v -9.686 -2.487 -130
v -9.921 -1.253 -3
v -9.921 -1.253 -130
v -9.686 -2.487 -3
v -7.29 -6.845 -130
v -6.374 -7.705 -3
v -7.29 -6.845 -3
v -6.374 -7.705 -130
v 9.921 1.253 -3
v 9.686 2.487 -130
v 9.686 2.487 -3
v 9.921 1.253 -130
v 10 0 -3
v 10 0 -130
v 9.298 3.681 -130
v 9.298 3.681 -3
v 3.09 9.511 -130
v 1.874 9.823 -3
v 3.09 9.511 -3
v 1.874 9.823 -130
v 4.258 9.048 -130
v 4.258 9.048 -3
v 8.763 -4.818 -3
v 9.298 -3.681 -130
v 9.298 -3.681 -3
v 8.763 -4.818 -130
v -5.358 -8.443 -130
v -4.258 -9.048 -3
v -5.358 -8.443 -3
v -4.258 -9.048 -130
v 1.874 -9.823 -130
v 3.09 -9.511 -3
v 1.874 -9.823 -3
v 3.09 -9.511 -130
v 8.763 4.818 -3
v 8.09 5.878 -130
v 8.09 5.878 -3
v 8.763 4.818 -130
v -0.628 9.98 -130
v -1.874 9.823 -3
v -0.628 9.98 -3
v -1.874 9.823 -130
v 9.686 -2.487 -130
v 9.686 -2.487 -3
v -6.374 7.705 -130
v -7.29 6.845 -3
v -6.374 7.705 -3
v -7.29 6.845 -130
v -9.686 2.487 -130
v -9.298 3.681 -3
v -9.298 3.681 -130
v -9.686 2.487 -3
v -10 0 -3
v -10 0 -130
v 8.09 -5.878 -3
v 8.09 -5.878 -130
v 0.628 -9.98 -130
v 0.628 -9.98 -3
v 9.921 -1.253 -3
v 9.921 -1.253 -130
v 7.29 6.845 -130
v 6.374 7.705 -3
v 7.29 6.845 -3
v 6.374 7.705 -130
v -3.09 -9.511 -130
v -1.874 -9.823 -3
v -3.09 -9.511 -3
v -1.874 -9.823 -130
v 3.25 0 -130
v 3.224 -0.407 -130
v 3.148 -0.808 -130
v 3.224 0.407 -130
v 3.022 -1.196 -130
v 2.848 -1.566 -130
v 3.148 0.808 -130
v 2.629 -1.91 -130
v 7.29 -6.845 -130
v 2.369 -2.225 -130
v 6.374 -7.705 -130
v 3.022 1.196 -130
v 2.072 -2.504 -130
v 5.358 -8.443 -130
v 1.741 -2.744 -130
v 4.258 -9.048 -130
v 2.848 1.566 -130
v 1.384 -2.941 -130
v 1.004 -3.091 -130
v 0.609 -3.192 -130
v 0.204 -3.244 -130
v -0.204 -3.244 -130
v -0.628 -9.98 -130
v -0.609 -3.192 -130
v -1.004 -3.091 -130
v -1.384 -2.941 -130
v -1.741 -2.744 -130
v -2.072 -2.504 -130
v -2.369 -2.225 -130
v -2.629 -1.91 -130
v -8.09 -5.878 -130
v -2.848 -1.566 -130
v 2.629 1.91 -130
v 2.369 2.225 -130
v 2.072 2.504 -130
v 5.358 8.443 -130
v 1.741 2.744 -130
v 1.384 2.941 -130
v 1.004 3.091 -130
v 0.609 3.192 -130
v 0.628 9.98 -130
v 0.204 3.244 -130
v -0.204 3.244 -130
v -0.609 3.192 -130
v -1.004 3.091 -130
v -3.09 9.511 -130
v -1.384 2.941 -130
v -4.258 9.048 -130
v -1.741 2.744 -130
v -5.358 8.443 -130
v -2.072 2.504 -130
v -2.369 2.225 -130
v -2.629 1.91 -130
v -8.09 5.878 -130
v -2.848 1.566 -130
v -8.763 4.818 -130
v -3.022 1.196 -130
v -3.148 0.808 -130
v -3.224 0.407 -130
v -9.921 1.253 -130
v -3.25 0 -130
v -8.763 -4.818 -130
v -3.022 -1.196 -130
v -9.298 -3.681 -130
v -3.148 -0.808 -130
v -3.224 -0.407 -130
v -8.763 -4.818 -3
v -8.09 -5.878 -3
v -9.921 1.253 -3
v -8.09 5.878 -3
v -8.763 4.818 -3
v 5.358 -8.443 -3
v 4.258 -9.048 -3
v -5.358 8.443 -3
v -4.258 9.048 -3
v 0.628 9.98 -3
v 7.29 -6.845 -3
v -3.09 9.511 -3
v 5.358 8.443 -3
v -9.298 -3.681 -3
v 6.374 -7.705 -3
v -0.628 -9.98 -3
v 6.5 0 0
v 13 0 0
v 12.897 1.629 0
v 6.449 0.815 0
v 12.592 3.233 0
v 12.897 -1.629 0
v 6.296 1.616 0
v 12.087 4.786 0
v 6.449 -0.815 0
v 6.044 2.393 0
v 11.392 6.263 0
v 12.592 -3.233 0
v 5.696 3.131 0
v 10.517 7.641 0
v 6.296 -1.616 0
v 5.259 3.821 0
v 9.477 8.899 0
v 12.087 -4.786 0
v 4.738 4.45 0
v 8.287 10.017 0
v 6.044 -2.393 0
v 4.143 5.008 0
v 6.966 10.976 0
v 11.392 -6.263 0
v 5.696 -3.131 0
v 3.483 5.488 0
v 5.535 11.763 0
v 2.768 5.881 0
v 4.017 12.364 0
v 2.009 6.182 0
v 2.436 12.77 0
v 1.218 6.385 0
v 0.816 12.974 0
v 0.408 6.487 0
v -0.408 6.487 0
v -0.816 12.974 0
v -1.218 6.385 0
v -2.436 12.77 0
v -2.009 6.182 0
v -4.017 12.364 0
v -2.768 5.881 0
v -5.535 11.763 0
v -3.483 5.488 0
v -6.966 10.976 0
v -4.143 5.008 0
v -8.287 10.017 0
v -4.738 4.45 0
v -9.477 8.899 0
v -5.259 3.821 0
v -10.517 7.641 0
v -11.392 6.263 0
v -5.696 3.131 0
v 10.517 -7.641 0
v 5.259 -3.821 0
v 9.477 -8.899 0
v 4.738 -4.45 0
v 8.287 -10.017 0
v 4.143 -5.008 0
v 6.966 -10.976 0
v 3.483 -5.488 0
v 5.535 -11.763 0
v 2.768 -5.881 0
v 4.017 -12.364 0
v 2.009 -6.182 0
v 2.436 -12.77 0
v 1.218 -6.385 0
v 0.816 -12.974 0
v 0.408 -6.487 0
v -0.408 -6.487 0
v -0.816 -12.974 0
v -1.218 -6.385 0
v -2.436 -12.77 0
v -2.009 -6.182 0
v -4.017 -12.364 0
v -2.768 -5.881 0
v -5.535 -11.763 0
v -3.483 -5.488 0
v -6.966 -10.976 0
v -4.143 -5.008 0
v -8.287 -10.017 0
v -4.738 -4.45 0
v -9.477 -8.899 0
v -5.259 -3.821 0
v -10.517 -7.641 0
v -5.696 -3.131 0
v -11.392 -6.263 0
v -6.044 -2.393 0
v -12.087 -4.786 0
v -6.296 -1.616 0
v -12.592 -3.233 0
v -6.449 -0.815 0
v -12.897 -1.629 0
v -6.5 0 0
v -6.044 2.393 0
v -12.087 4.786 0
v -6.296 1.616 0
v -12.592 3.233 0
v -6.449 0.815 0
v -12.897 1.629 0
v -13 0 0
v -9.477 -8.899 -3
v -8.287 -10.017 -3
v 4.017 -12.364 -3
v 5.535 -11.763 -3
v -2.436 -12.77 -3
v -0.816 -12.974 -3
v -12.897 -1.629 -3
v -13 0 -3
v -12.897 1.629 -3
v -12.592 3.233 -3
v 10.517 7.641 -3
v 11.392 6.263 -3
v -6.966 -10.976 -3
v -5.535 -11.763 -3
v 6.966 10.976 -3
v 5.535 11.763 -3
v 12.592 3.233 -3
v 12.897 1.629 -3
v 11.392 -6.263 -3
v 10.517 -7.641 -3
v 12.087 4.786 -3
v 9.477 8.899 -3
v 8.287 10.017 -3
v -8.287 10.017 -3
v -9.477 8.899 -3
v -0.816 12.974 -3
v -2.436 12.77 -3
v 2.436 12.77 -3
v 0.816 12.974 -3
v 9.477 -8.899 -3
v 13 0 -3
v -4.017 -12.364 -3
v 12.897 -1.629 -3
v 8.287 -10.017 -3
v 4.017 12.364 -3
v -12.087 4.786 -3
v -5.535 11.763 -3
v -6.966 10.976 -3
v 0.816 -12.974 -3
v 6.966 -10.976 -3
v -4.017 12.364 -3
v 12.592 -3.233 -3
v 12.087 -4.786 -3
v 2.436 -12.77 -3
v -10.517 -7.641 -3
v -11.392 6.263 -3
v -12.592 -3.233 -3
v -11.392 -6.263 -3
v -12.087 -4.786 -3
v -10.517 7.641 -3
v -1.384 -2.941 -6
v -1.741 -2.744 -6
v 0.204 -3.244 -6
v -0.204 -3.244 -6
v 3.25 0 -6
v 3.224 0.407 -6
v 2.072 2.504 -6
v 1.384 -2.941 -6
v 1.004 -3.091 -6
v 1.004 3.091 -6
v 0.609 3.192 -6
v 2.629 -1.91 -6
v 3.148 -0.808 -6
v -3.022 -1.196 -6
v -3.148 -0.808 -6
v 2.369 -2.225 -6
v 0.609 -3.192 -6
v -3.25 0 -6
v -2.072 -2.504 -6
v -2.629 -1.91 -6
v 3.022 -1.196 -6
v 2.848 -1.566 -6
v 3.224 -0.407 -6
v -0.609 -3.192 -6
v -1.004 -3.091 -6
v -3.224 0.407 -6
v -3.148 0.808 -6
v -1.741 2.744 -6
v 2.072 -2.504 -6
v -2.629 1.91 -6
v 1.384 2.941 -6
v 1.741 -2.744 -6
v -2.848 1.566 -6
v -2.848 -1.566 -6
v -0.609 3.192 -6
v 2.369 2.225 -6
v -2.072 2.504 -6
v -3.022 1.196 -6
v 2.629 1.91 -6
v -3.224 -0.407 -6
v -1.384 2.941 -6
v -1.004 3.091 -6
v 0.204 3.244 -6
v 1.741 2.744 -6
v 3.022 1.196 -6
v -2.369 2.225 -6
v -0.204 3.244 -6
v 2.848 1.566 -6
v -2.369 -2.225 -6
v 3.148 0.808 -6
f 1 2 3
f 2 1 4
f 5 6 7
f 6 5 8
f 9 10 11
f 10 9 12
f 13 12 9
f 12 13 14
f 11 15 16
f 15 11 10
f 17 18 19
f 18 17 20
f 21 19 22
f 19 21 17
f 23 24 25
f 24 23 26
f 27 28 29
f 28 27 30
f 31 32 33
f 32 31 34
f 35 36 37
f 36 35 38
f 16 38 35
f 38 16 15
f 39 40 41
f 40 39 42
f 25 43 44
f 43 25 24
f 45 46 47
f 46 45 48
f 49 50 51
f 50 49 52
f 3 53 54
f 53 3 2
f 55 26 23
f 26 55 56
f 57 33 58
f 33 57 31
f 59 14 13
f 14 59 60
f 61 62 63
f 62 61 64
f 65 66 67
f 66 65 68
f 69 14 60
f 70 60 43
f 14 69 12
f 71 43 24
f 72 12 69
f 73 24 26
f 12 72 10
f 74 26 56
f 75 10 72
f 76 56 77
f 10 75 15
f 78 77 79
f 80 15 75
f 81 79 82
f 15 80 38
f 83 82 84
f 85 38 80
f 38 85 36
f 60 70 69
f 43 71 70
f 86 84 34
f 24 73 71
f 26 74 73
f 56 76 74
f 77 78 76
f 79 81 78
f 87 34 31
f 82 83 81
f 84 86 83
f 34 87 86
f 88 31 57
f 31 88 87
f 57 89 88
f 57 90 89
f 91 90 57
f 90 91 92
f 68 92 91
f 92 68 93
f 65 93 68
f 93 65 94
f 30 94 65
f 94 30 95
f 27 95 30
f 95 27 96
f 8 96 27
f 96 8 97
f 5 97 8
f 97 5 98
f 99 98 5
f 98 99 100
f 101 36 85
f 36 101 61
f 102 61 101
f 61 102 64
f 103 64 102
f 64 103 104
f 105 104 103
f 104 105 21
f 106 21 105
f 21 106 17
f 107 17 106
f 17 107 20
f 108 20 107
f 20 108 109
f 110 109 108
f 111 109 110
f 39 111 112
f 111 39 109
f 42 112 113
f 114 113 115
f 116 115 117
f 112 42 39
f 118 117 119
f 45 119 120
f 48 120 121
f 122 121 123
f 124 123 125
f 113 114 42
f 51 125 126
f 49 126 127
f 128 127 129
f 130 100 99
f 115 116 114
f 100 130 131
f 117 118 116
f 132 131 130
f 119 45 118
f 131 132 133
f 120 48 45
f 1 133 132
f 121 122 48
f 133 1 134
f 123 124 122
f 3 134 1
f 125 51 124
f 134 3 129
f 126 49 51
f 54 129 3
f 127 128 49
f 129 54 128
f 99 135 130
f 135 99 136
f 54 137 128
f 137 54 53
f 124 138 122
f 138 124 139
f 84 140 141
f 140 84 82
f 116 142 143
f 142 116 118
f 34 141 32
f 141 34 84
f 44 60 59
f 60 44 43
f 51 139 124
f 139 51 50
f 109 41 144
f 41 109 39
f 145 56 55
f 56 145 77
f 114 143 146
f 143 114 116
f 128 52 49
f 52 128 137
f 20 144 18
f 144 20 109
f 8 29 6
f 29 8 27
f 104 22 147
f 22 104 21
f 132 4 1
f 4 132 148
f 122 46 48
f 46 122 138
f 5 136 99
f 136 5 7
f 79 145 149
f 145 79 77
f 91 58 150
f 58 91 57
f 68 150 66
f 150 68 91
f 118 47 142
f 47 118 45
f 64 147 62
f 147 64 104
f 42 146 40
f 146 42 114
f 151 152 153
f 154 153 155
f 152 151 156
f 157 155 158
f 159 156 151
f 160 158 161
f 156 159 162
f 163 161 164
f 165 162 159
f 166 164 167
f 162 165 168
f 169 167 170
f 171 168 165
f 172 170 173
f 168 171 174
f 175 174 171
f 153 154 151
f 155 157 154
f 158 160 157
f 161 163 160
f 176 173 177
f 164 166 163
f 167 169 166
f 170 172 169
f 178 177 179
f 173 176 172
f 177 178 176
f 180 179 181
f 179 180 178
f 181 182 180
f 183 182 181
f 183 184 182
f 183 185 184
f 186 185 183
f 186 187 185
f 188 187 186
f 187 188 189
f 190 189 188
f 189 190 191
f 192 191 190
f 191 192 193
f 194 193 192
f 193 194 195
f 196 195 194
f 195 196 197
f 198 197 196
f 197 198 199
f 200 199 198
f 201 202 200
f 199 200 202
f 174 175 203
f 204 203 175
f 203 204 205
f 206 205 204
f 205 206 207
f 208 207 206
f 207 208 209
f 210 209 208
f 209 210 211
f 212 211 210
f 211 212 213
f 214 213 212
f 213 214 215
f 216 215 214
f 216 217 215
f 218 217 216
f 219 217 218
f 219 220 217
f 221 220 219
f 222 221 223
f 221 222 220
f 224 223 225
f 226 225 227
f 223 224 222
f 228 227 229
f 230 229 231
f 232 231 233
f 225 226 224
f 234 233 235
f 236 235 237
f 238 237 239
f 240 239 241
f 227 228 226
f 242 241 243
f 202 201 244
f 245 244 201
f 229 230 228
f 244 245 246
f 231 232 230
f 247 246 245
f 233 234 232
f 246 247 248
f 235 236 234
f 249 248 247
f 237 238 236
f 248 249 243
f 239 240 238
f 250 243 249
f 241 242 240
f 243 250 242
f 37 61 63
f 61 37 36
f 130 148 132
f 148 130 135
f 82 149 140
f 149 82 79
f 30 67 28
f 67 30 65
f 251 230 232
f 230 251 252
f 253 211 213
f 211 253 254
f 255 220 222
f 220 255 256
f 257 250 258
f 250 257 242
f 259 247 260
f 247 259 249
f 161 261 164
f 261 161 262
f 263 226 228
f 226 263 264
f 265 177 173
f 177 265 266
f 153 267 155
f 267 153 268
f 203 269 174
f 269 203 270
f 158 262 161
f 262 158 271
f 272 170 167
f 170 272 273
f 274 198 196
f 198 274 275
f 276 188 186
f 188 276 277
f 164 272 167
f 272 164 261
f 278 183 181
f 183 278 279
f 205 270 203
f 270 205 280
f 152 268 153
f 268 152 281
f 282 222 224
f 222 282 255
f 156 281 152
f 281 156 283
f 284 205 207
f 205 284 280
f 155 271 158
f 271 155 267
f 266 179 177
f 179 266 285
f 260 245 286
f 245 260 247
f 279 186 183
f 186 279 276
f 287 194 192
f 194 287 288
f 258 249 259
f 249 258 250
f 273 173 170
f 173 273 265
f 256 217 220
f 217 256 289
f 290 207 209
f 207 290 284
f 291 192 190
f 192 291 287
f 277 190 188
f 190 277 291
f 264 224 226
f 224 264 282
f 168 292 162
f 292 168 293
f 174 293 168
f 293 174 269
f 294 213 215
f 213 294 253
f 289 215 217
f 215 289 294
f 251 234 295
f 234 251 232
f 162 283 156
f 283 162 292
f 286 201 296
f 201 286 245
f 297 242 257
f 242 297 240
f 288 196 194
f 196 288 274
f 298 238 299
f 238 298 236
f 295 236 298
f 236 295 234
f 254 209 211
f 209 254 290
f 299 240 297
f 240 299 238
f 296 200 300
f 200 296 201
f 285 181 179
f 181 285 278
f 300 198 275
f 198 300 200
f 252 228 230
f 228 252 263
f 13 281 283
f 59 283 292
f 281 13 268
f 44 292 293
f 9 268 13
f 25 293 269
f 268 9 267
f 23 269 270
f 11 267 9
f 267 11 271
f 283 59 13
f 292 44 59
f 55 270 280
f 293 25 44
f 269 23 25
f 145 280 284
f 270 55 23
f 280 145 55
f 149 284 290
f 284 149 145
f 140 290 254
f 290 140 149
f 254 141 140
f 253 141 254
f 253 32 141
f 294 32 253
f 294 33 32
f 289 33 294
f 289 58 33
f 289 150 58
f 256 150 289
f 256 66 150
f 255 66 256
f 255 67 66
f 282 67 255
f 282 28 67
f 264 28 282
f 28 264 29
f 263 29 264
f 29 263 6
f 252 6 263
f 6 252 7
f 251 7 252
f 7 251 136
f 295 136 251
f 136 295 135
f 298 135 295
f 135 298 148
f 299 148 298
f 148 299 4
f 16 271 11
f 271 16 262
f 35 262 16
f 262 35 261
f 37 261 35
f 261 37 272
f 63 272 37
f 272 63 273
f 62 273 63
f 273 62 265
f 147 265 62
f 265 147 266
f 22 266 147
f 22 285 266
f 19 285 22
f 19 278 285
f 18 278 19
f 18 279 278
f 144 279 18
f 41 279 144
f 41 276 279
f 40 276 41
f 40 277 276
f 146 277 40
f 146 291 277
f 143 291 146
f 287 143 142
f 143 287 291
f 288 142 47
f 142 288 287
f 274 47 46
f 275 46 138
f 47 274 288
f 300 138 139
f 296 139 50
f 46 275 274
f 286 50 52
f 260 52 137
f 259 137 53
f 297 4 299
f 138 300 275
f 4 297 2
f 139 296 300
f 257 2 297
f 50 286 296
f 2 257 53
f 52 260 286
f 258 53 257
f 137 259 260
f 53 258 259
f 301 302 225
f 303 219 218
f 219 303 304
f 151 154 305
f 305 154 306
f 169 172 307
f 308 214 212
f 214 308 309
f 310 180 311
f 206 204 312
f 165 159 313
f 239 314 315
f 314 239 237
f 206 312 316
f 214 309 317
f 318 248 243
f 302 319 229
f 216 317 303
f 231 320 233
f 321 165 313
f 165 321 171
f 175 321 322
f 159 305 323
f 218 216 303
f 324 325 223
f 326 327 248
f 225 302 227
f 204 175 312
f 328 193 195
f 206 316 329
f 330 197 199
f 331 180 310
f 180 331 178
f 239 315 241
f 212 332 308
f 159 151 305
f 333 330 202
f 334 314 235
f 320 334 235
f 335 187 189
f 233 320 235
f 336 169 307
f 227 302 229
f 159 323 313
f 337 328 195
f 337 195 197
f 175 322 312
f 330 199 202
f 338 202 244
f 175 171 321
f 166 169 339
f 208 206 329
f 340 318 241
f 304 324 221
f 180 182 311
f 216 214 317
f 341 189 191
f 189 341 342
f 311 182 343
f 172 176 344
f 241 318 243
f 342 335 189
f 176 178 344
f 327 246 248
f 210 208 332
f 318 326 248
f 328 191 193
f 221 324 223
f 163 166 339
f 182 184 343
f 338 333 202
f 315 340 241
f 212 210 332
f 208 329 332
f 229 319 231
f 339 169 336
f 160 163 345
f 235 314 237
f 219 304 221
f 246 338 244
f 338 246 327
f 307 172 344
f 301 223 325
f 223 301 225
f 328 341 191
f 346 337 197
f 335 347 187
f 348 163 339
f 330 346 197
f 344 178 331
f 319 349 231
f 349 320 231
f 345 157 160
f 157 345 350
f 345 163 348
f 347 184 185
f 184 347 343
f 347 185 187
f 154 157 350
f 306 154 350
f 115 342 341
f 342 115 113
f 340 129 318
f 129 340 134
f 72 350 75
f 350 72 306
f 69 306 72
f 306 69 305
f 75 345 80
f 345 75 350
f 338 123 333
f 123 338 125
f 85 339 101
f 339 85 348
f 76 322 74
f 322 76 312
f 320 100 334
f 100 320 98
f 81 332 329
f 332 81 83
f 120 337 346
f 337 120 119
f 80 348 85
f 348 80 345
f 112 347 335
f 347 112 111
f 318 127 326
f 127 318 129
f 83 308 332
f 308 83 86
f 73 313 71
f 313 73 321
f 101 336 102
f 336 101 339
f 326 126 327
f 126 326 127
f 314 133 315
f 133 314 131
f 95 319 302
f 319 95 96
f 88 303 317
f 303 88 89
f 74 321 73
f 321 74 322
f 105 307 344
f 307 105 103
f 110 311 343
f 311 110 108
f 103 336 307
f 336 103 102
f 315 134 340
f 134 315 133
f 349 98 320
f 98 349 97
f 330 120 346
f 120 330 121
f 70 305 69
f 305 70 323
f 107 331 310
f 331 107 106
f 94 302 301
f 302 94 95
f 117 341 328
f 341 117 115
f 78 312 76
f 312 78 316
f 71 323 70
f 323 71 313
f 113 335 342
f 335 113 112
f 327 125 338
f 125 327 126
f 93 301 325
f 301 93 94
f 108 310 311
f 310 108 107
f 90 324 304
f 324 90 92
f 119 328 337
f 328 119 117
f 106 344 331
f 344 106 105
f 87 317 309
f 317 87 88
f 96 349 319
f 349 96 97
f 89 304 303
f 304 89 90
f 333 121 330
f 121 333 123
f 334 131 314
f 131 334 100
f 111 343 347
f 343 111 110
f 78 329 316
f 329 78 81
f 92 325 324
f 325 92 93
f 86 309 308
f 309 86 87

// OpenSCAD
$fn = 50;


difference() {
	union() {
		translate(v = [0, 0, -130.0000000000]) {
			cylinder(h = 130, r = 10.0000000000);
		}
		translate(v = [0, 0, -3.0000000000]) {
			cylinder(h = 3, r = 13.0000000000);
		}
	}
	union() {
		translate(v = [0, 0, 0]) {
			rotate(a = [0, 0, 0]) {
				difference() {
					union() {
						#translate(v = [0, 0, -130.0000000000]) {
							cylinder(h = 130, r = 2.2500000000);
						}
						#translate(v = [0, 0, -6]) {
							cylinder(h = 6, r = 10.0000000000, r1 = 3.2500000000, r2 = 6.5000000000);
						}
						#translate(v = [0, 0, -130.0000000000]) {
							cylinder(h = 130, r = 3.2500000000);
						}
						#translate(v = [0, 0, -130.0000000000]) {
							cylinder(h = 130, r = 2.2500000000);
						}
					}
					union();
				}
			}
		}
	}
}
